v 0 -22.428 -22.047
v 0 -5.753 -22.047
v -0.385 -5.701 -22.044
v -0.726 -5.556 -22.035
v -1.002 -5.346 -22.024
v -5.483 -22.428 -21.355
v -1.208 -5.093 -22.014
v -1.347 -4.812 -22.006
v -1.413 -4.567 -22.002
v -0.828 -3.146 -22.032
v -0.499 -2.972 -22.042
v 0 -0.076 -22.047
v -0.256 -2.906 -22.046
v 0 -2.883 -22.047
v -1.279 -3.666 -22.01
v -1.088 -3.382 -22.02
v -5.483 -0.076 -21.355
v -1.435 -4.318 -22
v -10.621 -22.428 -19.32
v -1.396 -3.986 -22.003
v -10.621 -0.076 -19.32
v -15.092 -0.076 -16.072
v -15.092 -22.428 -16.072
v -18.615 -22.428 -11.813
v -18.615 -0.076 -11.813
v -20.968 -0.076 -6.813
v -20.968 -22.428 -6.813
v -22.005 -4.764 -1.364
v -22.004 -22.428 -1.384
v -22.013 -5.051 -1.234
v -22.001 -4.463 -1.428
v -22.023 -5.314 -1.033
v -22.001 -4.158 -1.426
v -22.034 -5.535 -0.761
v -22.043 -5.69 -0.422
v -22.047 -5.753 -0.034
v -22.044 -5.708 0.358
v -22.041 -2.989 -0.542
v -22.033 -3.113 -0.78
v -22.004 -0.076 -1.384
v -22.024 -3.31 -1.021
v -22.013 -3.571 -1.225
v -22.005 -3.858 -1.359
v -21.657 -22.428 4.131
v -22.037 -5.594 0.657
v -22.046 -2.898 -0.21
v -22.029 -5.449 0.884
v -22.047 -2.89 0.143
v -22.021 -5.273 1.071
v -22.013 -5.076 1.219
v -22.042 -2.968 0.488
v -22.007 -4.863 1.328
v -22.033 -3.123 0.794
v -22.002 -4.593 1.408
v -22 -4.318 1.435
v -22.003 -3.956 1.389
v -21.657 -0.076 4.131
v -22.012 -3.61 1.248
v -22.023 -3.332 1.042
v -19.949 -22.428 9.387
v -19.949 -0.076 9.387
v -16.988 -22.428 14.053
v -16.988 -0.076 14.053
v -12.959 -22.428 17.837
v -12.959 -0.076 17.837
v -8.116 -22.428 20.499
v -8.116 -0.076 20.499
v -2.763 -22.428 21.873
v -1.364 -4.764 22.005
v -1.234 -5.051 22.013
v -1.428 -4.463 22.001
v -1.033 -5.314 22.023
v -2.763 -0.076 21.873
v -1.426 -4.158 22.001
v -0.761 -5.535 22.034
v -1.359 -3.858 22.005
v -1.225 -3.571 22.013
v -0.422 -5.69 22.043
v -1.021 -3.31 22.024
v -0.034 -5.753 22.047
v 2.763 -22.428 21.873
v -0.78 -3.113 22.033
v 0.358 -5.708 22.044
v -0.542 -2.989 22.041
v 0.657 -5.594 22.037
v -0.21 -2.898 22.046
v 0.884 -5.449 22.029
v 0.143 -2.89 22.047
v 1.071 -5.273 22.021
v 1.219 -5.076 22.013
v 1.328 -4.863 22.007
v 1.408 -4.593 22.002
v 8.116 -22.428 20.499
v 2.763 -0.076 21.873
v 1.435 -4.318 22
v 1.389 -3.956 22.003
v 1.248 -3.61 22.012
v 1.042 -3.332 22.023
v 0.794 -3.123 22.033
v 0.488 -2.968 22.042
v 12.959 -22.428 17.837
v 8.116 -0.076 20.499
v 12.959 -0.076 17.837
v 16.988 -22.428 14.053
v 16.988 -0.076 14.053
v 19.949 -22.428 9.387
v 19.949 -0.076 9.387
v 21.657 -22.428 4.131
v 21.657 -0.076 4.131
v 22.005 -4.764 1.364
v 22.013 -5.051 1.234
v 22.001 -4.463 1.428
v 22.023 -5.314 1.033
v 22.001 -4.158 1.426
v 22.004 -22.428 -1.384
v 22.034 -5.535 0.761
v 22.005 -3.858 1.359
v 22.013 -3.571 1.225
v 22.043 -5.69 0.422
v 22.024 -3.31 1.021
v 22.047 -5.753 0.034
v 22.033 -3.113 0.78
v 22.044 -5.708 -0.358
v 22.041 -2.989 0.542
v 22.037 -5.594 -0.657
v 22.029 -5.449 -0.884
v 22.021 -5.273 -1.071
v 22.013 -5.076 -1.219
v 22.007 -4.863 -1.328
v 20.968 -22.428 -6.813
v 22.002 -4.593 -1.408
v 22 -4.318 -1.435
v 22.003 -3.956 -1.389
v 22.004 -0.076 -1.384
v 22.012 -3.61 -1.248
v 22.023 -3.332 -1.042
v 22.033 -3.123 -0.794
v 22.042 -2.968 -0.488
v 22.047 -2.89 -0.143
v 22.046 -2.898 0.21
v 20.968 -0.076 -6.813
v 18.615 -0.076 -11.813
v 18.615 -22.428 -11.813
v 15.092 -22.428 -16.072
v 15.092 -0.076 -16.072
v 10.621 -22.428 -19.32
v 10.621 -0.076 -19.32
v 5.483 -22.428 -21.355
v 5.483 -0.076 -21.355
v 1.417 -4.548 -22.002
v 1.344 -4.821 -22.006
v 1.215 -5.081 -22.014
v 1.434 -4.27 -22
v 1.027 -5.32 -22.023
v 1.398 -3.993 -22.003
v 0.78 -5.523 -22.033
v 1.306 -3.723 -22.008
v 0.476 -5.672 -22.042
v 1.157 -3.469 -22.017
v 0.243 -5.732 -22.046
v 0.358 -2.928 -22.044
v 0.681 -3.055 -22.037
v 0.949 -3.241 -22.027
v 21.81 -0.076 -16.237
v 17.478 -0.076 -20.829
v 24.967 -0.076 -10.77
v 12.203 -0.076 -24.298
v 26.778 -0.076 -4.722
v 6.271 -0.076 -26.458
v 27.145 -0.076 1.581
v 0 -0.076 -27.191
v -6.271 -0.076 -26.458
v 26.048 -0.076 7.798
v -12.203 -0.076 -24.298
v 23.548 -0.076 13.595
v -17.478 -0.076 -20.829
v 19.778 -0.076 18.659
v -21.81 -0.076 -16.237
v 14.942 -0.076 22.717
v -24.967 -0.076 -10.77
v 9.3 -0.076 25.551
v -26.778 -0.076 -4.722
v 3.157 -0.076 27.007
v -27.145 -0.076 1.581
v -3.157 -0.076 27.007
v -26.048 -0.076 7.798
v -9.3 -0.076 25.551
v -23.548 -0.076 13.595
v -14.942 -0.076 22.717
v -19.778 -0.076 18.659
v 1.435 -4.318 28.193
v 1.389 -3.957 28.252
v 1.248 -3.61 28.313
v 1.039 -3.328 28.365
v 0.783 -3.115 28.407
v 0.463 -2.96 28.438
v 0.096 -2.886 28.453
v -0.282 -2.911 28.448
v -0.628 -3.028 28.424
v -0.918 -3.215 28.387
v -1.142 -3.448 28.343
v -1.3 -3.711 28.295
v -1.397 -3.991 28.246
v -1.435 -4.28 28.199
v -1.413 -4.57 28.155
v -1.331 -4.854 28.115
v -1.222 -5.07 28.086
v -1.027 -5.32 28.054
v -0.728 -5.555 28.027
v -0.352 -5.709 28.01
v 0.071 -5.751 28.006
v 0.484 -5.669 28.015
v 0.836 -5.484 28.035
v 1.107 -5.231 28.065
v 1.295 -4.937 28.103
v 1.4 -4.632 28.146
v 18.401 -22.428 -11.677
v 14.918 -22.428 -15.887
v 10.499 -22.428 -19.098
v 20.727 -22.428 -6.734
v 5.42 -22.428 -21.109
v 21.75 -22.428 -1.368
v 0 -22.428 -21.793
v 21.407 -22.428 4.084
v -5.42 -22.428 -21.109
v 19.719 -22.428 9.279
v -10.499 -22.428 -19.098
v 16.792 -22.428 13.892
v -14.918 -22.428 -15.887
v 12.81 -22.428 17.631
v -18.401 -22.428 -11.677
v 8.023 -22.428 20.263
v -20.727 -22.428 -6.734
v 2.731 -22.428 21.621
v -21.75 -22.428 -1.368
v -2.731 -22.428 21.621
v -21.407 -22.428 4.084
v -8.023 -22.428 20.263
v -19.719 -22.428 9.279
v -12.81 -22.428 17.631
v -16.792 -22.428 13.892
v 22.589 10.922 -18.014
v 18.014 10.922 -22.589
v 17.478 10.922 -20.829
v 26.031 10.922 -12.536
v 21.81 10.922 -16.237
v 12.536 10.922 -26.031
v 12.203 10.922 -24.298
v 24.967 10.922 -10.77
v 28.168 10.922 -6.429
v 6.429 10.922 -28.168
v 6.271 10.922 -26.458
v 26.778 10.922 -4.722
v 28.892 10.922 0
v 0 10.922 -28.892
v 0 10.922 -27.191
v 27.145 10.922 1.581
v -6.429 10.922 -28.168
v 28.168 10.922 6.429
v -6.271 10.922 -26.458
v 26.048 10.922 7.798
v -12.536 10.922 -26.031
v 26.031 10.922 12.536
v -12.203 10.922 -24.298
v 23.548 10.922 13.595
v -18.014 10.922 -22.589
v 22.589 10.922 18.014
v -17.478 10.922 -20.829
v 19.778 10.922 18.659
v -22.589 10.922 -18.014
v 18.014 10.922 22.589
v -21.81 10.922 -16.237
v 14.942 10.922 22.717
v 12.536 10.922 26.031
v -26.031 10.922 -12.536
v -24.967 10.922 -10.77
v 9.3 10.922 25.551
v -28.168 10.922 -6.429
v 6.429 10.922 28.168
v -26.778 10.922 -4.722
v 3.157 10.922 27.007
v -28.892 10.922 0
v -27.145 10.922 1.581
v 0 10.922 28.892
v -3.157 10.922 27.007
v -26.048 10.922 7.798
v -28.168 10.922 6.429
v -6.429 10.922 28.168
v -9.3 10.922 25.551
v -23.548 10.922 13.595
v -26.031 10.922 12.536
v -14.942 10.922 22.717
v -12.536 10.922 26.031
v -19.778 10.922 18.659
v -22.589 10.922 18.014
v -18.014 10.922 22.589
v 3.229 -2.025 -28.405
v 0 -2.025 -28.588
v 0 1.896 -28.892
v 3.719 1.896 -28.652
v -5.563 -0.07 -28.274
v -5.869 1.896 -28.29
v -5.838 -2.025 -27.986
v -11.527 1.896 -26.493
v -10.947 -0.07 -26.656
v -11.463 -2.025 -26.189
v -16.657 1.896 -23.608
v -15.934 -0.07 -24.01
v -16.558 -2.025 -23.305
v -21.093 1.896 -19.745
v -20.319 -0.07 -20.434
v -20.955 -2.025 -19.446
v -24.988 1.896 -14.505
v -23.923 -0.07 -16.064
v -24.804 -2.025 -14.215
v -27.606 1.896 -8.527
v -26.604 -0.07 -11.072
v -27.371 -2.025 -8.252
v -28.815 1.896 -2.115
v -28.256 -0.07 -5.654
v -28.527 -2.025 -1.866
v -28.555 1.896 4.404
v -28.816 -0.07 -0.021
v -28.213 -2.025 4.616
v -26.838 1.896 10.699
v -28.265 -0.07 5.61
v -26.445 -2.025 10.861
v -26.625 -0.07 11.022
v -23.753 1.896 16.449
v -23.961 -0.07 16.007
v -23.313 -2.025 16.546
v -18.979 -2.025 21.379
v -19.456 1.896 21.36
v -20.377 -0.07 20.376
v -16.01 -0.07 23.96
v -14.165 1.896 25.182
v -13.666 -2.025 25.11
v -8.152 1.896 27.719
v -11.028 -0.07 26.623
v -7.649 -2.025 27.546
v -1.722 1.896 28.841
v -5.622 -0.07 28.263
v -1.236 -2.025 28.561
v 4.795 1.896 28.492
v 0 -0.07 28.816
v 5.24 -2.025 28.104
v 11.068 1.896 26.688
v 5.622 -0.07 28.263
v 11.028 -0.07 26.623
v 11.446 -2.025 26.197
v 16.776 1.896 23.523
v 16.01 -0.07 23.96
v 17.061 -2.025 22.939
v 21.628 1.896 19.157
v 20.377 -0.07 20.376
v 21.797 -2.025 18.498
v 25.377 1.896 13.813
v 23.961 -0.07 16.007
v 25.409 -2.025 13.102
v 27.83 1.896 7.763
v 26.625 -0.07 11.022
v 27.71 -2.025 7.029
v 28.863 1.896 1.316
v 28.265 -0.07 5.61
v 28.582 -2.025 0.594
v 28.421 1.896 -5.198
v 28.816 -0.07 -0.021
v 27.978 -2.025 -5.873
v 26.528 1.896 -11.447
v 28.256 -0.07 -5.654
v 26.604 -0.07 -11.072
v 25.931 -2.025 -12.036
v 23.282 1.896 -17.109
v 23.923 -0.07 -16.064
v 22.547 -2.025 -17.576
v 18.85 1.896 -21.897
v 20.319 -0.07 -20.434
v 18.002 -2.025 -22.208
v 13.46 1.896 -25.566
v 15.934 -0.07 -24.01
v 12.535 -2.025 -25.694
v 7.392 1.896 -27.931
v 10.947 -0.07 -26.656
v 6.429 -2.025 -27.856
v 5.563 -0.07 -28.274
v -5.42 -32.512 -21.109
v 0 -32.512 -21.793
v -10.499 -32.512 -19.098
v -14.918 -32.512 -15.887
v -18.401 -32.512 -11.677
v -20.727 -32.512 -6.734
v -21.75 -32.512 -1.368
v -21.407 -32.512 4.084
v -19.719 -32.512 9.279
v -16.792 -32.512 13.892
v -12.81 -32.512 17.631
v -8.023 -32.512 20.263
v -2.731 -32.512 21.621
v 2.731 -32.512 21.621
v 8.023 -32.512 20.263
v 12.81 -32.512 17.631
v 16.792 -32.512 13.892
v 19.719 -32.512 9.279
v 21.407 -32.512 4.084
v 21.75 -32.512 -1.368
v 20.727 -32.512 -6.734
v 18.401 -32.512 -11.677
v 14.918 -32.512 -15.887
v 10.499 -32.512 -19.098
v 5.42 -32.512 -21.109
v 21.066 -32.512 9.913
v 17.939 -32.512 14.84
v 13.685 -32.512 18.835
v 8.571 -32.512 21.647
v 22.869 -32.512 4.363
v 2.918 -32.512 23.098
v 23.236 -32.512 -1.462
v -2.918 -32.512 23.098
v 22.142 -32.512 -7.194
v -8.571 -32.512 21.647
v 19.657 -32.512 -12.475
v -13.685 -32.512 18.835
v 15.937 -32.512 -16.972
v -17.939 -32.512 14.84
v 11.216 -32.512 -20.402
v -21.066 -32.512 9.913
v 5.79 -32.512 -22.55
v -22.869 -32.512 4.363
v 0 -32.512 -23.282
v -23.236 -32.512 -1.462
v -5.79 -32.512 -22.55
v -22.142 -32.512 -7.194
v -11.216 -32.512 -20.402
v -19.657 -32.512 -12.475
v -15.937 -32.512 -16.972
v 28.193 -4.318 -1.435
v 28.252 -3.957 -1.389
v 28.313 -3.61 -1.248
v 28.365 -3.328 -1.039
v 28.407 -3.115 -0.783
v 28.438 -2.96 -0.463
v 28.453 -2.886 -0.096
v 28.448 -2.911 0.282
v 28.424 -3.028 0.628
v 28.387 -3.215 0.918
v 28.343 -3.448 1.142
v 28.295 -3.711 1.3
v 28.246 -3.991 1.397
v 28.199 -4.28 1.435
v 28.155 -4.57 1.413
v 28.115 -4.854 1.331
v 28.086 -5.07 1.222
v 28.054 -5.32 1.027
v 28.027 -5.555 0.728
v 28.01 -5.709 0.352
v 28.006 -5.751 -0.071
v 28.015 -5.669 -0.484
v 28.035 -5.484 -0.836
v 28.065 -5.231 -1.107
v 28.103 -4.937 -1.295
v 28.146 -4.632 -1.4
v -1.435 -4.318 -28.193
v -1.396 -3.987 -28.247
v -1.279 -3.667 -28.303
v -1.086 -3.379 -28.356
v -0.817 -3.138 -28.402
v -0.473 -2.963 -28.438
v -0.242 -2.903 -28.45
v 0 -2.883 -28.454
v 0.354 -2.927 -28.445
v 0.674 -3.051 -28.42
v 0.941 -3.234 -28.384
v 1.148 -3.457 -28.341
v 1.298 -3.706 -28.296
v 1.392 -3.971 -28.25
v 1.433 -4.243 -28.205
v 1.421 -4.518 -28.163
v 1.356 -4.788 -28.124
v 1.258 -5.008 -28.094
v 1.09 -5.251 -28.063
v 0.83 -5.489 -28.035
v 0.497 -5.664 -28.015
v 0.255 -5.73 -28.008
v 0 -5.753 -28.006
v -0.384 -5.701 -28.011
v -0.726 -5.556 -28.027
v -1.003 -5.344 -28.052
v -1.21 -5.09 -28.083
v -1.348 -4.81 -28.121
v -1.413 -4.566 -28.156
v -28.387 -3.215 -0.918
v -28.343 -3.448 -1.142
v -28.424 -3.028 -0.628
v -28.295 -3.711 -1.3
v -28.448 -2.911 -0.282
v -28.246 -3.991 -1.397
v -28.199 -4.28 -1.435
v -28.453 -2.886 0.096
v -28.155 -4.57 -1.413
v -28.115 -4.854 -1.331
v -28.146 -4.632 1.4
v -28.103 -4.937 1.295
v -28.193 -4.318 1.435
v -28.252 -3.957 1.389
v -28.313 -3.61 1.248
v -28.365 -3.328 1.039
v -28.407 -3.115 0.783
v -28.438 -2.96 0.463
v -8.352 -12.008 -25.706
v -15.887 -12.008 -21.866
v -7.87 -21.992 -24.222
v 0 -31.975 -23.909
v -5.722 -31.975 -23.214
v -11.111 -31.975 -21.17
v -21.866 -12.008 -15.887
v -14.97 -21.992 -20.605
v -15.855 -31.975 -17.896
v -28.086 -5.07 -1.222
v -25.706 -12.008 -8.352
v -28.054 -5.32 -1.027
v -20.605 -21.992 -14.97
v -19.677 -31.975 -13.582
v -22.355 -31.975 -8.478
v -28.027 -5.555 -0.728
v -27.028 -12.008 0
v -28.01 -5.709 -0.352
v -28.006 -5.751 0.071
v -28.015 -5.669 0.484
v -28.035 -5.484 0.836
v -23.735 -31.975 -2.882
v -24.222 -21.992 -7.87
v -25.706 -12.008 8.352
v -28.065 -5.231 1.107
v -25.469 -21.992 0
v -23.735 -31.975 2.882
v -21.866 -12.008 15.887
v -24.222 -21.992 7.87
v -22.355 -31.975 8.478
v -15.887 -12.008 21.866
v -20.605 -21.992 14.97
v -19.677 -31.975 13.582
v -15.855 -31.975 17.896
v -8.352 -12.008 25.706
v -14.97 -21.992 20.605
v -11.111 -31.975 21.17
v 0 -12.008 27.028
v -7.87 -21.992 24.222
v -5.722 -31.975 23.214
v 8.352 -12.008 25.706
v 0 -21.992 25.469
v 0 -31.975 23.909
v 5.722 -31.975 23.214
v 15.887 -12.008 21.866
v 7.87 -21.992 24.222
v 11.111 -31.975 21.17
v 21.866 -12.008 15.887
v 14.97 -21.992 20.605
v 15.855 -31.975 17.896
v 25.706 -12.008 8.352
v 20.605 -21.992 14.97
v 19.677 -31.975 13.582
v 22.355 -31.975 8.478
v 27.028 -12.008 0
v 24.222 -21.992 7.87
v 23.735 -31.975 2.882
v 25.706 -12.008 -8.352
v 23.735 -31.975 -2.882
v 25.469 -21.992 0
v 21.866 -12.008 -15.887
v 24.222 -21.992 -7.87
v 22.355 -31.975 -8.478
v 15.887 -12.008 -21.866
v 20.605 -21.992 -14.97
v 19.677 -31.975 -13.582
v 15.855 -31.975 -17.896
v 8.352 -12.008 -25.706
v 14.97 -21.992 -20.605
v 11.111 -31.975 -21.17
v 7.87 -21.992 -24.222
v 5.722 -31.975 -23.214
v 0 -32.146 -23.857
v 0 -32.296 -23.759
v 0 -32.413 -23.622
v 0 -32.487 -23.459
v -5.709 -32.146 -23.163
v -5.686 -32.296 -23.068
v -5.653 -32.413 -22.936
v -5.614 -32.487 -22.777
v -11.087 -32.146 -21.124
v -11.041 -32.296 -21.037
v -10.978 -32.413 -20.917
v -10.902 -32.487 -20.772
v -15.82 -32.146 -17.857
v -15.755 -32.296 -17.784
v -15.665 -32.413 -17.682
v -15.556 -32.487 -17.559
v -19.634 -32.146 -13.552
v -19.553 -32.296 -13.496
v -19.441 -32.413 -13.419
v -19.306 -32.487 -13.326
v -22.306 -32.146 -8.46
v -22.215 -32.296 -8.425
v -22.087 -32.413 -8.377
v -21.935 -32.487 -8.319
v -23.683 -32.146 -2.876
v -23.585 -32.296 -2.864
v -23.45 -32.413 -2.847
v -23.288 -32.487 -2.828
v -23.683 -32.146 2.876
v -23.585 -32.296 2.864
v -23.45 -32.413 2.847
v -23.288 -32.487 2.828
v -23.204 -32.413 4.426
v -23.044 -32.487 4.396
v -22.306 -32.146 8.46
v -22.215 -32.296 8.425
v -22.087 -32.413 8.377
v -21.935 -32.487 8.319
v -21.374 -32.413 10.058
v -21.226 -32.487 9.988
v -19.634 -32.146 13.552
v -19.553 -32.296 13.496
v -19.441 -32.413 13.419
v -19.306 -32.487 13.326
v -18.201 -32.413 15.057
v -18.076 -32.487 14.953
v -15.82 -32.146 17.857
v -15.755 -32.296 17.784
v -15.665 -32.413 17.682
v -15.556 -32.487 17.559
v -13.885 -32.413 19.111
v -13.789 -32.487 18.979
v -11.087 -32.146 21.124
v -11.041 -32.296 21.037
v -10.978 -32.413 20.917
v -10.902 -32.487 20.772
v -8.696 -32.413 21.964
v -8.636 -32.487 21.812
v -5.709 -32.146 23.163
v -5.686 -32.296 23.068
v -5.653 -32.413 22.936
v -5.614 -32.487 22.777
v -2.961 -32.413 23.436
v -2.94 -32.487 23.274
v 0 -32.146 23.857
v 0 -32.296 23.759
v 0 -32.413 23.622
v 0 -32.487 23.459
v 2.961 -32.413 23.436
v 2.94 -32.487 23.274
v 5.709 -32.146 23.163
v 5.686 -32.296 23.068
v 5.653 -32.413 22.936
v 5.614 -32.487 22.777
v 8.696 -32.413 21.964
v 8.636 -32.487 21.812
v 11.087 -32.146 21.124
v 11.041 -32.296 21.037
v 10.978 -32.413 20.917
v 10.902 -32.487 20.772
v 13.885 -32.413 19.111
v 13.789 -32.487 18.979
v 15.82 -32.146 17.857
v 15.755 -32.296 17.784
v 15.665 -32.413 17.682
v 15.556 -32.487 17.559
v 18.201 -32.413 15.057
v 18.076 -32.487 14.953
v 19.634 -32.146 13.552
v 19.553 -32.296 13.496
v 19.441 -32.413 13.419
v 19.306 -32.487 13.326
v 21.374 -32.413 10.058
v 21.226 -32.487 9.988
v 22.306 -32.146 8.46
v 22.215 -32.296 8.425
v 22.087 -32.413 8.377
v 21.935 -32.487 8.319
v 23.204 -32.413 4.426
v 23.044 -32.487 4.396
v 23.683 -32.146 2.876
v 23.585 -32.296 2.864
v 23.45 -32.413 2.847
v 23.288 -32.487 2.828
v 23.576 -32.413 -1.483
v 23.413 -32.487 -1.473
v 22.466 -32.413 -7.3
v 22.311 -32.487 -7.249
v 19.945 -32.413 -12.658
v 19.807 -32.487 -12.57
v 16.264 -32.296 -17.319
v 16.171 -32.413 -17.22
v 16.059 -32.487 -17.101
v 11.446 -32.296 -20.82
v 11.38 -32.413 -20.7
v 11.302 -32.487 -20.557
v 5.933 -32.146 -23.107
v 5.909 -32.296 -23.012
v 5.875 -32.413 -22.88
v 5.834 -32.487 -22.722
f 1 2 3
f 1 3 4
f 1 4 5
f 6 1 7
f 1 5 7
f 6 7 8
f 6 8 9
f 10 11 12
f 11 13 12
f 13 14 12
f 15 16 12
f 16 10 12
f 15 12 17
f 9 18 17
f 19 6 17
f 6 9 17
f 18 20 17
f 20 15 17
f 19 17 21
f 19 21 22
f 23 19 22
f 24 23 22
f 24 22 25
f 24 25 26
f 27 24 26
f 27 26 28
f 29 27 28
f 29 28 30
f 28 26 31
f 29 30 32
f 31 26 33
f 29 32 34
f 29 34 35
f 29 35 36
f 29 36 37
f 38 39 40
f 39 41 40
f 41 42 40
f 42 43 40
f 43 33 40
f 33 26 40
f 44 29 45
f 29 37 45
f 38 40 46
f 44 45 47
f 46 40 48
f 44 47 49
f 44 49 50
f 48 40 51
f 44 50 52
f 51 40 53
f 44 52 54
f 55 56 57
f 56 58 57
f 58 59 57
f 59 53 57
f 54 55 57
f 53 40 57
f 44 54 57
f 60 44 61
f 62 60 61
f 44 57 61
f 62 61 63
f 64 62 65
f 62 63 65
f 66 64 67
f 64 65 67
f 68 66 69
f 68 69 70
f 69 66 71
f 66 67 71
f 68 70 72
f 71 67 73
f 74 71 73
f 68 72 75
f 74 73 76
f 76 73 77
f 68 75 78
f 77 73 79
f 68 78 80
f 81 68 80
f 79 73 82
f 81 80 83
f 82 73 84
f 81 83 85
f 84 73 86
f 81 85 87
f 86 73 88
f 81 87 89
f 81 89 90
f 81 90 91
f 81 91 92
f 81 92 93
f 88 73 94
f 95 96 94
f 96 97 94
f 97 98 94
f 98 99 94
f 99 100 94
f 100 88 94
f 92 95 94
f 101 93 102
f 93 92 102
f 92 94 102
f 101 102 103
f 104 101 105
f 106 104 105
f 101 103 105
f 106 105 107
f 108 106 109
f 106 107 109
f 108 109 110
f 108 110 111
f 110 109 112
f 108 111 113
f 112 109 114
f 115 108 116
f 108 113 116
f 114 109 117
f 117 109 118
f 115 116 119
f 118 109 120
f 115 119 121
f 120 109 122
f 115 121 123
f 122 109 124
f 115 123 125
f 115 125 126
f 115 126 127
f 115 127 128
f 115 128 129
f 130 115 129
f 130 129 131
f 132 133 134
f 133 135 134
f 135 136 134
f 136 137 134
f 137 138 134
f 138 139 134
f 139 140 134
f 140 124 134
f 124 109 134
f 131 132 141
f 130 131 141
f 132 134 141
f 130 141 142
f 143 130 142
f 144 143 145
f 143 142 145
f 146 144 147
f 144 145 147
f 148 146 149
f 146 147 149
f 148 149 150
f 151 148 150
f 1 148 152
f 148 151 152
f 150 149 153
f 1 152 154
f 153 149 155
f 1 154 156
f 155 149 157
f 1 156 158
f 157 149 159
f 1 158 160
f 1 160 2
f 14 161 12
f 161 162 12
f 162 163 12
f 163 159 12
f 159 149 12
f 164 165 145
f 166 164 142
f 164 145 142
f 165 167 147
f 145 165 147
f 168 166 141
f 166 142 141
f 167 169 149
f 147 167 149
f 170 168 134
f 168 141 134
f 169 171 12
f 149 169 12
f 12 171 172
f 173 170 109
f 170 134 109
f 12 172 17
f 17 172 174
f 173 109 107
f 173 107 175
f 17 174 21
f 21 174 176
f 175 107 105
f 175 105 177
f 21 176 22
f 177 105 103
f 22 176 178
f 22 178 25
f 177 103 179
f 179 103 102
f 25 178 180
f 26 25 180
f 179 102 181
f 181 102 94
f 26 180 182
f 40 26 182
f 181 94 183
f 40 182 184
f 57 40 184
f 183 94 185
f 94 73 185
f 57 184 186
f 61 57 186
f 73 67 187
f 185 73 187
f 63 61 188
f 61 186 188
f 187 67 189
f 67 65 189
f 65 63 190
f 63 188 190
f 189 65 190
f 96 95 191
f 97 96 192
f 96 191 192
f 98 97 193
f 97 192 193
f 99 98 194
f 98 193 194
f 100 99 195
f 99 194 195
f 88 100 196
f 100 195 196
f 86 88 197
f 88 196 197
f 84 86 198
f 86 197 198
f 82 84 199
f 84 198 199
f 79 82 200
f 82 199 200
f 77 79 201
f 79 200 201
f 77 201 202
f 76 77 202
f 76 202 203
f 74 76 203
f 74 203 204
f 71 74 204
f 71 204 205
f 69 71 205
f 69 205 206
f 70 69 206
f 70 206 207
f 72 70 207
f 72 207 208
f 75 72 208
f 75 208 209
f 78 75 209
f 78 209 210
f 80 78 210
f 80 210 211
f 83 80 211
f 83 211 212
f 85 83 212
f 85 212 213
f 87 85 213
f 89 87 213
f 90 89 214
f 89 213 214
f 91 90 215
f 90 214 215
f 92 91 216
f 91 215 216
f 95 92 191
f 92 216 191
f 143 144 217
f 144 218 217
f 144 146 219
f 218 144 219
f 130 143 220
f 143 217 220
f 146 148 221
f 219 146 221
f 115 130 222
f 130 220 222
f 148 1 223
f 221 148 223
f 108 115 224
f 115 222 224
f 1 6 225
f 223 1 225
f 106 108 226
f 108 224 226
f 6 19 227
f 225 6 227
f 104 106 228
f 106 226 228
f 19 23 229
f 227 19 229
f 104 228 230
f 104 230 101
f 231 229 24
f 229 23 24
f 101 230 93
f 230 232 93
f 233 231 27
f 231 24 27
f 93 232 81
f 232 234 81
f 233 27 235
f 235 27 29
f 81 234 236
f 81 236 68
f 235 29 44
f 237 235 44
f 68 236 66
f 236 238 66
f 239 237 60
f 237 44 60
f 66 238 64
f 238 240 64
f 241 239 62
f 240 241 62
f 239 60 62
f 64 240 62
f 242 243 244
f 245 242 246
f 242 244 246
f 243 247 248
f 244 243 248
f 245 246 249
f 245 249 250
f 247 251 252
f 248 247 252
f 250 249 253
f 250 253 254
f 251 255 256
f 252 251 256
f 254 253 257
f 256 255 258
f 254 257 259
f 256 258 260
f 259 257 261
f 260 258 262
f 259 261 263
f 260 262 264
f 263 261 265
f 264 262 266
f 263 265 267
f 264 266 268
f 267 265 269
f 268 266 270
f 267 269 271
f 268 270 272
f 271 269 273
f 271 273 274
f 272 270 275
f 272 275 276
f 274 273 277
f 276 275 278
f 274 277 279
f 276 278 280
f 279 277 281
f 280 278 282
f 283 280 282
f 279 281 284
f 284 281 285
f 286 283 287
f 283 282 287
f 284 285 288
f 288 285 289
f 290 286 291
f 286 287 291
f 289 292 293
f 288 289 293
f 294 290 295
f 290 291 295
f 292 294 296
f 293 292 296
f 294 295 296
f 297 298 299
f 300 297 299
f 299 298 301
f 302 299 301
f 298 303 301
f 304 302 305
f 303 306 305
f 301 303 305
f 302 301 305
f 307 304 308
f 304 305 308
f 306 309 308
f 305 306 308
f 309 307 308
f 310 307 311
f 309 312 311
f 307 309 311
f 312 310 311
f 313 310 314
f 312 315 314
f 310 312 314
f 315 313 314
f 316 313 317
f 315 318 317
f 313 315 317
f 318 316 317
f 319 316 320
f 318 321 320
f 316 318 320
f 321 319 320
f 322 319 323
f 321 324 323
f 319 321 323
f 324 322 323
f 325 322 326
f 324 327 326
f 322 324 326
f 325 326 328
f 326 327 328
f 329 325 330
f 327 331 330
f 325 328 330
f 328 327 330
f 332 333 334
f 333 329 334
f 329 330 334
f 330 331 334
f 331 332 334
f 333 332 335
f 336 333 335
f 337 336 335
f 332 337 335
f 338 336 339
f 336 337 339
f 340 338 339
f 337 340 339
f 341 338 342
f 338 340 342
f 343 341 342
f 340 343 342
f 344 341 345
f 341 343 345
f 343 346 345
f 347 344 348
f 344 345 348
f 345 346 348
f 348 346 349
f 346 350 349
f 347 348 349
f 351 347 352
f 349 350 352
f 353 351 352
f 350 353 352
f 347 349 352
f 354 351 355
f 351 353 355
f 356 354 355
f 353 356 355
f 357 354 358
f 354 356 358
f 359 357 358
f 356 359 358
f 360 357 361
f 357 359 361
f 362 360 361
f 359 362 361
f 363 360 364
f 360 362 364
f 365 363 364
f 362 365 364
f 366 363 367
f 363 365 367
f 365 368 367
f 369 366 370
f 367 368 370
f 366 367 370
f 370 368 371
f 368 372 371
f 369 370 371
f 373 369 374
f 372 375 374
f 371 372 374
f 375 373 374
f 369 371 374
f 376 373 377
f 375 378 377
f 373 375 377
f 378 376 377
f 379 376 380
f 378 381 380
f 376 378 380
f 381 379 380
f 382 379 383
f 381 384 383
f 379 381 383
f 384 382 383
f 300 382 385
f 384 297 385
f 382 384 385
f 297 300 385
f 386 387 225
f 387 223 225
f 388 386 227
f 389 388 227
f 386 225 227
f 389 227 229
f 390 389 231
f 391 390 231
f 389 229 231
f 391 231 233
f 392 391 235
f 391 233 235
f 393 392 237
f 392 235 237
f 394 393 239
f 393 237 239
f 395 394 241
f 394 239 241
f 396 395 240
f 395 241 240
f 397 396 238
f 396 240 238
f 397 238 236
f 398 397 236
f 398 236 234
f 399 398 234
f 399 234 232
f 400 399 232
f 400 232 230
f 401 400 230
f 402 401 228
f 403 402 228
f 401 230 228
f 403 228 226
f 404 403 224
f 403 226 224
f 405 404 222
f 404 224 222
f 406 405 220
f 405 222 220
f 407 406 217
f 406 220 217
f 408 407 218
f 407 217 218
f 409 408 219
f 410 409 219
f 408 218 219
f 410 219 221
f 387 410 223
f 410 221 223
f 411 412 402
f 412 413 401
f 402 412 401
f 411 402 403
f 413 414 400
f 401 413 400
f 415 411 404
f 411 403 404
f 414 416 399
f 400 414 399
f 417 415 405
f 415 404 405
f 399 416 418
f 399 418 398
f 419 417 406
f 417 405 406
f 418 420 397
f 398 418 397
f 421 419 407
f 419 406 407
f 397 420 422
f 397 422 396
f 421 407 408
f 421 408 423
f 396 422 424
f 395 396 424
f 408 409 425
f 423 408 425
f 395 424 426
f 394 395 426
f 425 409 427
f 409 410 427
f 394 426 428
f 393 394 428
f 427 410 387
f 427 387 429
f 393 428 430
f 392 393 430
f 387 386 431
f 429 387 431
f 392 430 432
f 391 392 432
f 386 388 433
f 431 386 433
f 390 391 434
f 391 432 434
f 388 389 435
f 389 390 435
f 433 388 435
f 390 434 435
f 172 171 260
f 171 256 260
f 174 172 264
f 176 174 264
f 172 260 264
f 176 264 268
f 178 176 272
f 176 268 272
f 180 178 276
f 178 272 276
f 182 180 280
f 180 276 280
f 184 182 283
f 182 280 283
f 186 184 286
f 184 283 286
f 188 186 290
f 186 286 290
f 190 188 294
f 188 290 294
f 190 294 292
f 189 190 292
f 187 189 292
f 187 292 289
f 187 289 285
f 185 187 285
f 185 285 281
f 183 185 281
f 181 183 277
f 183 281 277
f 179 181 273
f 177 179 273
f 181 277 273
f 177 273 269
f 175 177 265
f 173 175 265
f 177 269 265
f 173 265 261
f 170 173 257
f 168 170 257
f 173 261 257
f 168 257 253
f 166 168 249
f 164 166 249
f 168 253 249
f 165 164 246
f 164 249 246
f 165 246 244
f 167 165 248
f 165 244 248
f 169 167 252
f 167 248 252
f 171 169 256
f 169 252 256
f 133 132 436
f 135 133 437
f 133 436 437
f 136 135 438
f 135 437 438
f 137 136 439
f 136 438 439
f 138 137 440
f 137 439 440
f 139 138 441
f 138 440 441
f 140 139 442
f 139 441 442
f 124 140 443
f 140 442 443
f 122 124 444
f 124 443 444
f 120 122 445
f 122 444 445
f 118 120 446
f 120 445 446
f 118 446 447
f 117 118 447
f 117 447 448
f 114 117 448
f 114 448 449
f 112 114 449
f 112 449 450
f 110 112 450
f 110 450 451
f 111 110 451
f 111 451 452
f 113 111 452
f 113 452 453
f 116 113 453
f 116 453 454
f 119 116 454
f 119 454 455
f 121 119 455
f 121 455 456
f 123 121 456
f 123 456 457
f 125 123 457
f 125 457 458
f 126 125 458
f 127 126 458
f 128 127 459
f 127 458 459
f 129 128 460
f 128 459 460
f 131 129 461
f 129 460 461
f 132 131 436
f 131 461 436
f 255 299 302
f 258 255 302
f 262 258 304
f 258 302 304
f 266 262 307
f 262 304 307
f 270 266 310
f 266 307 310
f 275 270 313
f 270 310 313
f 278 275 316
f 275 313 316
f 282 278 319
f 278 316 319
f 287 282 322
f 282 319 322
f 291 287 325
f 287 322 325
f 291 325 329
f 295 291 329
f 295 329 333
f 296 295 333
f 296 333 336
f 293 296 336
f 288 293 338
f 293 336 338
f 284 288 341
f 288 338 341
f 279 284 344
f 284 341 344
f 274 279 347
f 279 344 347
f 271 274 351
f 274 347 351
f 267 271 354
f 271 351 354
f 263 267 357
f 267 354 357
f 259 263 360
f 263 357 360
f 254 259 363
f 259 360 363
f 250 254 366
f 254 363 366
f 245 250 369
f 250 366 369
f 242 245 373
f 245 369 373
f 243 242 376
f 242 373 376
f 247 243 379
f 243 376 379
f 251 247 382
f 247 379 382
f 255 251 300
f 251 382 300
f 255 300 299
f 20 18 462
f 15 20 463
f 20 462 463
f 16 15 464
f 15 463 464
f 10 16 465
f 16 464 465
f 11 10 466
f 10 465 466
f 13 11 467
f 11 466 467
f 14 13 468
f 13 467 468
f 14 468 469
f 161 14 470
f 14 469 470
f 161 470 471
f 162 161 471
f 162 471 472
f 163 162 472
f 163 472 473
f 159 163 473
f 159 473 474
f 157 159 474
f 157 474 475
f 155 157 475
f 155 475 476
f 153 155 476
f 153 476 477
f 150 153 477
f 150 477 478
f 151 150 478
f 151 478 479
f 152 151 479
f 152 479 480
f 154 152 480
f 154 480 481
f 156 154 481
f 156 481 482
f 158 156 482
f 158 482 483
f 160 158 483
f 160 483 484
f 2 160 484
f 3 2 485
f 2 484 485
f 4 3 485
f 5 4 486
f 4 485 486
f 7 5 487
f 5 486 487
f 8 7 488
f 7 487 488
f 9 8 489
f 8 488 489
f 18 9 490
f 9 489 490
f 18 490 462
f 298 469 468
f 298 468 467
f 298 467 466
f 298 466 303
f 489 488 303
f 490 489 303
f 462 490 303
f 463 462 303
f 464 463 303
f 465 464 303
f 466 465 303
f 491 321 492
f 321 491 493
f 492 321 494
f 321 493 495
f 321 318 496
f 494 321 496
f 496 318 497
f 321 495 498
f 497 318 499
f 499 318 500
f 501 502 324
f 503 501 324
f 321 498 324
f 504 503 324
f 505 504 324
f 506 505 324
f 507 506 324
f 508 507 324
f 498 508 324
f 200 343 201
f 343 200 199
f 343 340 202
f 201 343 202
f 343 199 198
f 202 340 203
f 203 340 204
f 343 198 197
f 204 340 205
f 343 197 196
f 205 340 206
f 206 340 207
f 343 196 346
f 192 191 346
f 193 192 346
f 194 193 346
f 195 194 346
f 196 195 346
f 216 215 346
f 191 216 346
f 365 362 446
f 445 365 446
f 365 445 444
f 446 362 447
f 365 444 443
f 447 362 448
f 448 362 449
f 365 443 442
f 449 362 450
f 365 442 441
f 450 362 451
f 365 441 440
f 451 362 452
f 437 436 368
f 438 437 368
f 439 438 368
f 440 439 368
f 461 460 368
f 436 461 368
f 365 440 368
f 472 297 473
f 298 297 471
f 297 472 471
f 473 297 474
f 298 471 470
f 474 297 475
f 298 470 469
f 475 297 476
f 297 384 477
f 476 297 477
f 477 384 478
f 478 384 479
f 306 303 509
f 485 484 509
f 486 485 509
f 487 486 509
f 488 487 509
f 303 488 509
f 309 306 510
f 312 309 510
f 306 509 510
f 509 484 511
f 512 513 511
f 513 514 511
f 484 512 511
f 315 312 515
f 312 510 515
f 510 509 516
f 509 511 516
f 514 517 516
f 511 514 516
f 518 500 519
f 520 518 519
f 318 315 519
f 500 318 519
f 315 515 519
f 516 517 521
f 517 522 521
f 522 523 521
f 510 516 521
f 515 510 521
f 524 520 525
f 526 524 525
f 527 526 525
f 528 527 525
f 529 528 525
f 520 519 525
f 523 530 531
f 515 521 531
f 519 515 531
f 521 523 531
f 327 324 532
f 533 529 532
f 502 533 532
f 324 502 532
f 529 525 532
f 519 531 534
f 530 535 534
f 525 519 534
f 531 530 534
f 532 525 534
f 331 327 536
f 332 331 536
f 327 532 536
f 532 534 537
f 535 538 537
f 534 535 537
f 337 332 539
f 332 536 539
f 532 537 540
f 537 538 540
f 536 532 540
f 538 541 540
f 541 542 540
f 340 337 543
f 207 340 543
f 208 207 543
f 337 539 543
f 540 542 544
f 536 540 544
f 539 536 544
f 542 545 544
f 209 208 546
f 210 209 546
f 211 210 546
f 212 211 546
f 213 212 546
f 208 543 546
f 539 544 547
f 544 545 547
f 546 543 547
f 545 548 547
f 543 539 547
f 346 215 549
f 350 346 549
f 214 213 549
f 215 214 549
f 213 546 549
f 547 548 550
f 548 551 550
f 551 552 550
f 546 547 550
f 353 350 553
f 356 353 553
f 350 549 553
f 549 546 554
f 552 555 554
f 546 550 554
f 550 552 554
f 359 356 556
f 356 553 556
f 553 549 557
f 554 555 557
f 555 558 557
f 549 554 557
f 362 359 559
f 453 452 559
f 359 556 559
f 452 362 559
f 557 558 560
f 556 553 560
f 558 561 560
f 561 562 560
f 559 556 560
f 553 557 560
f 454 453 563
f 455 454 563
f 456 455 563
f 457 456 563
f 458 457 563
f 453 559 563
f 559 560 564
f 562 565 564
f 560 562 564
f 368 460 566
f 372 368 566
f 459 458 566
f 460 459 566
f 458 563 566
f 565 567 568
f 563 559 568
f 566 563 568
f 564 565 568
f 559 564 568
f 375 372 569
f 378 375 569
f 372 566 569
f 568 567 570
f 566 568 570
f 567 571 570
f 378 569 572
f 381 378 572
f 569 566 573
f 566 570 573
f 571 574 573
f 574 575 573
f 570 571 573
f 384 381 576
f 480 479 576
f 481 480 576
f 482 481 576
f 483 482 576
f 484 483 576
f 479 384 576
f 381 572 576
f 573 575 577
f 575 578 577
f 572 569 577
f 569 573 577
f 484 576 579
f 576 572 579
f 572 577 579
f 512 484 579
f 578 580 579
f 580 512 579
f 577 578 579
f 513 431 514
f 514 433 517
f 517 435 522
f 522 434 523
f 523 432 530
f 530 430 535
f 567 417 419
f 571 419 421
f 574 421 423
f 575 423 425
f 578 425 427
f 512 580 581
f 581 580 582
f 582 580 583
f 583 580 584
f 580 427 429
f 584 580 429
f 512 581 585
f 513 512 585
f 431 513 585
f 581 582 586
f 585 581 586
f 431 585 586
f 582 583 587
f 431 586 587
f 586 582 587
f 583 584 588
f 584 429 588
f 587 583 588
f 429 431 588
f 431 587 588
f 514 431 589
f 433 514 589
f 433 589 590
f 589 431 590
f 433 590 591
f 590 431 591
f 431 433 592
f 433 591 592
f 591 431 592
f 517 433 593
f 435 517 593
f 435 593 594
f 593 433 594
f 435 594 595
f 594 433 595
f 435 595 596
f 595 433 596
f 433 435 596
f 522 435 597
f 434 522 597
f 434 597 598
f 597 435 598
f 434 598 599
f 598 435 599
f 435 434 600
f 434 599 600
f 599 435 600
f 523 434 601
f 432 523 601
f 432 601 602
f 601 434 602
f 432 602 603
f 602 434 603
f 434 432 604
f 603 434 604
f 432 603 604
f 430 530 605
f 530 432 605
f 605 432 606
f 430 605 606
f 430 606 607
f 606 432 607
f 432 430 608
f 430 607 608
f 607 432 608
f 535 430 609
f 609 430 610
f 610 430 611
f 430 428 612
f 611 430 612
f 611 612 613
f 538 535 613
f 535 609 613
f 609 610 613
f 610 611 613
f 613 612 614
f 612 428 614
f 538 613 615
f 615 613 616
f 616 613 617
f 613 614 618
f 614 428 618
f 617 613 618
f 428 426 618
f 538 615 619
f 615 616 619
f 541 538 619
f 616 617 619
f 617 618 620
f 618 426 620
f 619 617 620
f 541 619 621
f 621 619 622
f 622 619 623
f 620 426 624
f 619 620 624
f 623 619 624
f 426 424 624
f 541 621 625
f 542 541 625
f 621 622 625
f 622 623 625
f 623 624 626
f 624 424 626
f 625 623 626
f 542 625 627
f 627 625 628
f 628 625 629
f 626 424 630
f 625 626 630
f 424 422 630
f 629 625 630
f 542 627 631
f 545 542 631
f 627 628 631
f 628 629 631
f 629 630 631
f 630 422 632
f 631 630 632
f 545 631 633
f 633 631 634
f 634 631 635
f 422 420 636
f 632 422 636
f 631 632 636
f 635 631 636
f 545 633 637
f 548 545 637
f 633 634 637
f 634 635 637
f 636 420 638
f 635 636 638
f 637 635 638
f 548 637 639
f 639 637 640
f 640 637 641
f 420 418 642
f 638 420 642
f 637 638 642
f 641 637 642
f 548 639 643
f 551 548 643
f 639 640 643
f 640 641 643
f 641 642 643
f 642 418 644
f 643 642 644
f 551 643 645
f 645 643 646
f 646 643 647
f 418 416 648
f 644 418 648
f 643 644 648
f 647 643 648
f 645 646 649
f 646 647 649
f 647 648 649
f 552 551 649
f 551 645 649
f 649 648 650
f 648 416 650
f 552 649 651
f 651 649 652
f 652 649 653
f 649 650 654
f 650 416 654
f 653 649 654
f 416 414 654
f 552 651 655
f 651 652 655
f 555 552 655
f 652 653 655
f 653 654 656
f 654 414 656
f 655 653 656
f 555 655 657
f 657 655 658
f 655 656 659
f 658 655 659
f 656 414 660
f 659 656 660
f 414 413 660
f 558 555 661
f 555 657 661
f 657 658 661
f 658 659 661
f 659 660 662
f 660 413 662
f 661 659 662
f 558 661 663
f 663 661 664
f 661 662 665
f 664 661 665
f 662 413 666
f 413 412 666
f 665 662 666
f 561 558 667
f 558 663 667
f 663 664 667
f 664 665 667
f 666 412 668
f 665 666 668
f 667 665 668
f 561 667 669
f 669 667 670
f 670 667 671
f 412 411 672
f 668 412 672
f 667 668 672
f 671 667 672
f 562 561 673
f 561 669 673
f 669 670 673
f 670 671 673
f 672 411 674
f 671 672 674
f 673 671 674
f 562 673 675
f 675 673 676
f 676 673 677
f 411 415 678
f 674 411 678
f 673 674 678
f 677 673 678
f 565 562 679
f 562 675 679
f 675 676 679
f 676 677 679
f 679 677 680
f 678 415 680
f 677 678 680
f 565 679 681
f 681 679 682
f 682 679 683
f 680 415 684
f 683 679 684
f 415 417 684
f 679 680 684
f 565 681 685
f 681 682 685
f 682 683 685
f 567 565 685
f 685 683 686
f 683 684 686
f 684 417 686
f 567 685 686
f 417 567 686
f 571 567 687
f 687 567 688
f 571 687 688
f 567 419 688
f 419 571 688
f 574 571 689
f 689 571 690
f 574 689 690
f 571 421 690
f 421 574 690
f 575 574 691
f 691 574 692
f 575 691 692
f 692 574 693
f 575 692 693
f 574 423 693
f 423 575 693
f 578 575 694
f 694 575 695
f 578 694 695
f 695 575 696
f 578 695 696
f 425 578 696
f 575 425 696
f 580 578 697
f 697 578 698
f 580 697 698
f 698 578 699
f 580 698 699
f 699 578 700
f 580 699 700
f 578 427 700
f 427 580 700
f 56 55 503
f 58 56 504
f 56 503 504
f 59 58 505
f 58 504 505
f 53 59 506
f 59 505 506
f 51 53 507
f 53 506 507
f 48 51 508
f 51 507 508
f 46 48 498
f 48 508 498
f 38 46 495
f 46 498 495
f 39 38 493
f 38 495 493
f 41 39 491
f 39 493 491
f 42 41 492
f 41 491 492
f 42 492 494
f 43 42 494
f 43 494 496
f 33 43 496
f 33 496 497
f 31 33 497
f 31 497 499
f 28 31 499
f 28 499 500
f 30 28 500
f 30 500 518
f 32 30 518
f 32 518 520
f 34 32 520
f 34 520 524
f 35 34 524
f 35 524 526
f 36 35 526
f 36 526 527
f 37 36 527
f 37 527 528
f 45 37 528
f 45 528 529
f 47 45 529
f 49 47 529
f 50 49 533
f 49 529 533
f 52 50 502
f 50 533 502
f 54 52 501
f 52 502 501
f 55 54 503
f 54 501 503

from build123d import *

# Parameters (mm, degrees)
F_6_40_TAPPED_HOLE1_REACH  = 74.325
F_6_40_TAPPED_HOLE1_BORE_R = 1.4351
CIRPATTERN1_COUNT          = 4
FILLET1_R                  = 0.635
FILLET2_R                  = 25.4


with BuildPart() as part:
    # Sketch2 → Revolve1 (revolve)
    with BuildSketch(Plane.XY, mode=Mode.PRIVATE) as revolve1_sk:
        Polygon((22.0472, -22.4282), (22.0472, -0.0762), (27.1907, -0.0762), (27.1907, 10.922), (28.8925, 10.922), (28.8925, -0.0762), (23.8252, -32.512), (21.7932, -32.512), (21.7932, -22.4282), align=None)
    revolve(revolve1_sk.sketch.rotate(Axis((0, -34.5451, 0), (0, 1, 0)), 90), axis=Axis((0, -34.5451, 0), (0, 1, 0)))

    # #6-40 Tapped Hole1 bore → #6-40 Tapped Hole1 (cut, up to next)
    with BuildSketch(Plane.XY.offset(28.8925), mode=Mode.PRIVATE) as f_6_40_tapped_hole1_sk1:
        with Locations((0, -4.318)):
            Circle(F_6_40_TAPPED_HOLE1_BORE_R)
    f_6_40_tapped_hole1_tool1 = extrude(f_6_40_tapped_hole1_sk1.sketch, amount=-F_6_40_TAPPED_HOLE1_REACH, mode=Mode.PRIVATE) & part.part
    f_6_40_tapped_hole1 = f_6_40_tapped_hole1_tool1.solids().sort_by_distance((0, -4.318, 28.8925))[0]
    add(f_6_40_tapped_hole1, mode=Mode.SUBTRACT)

    # CirPattern1: #6-40 Tapped Hole1 ×4 about axis
    cirpattern1_axis = Axis((0, -34.5451, 0), (0, -1, 0))
    for i in range(1, CIRPATTERN1_COUNT):
        add(f_6_40_tapped_hole1.rotate(cirpattern1_axis, i * 360 / CIRPATTERN1_COUNT), mode=Mode.SUBTRACT)

    # Fillet1
    fillet1_edges = [part.edges().sort_by_distance(p)[0] for p in [
        (0, -32.512, 23.8252),
    ]]
    fillet(fillet1_edges, radius=FILLET1_R)

    # Fillet2
    fillet2_edges = [part.edges().sort_by_distance(p)[0] for p in [
        (0, -0.0762, 28.8925),
    ]]
    fillet(fillet2_edges, radius=FILLET2_R)


solid = part.part
